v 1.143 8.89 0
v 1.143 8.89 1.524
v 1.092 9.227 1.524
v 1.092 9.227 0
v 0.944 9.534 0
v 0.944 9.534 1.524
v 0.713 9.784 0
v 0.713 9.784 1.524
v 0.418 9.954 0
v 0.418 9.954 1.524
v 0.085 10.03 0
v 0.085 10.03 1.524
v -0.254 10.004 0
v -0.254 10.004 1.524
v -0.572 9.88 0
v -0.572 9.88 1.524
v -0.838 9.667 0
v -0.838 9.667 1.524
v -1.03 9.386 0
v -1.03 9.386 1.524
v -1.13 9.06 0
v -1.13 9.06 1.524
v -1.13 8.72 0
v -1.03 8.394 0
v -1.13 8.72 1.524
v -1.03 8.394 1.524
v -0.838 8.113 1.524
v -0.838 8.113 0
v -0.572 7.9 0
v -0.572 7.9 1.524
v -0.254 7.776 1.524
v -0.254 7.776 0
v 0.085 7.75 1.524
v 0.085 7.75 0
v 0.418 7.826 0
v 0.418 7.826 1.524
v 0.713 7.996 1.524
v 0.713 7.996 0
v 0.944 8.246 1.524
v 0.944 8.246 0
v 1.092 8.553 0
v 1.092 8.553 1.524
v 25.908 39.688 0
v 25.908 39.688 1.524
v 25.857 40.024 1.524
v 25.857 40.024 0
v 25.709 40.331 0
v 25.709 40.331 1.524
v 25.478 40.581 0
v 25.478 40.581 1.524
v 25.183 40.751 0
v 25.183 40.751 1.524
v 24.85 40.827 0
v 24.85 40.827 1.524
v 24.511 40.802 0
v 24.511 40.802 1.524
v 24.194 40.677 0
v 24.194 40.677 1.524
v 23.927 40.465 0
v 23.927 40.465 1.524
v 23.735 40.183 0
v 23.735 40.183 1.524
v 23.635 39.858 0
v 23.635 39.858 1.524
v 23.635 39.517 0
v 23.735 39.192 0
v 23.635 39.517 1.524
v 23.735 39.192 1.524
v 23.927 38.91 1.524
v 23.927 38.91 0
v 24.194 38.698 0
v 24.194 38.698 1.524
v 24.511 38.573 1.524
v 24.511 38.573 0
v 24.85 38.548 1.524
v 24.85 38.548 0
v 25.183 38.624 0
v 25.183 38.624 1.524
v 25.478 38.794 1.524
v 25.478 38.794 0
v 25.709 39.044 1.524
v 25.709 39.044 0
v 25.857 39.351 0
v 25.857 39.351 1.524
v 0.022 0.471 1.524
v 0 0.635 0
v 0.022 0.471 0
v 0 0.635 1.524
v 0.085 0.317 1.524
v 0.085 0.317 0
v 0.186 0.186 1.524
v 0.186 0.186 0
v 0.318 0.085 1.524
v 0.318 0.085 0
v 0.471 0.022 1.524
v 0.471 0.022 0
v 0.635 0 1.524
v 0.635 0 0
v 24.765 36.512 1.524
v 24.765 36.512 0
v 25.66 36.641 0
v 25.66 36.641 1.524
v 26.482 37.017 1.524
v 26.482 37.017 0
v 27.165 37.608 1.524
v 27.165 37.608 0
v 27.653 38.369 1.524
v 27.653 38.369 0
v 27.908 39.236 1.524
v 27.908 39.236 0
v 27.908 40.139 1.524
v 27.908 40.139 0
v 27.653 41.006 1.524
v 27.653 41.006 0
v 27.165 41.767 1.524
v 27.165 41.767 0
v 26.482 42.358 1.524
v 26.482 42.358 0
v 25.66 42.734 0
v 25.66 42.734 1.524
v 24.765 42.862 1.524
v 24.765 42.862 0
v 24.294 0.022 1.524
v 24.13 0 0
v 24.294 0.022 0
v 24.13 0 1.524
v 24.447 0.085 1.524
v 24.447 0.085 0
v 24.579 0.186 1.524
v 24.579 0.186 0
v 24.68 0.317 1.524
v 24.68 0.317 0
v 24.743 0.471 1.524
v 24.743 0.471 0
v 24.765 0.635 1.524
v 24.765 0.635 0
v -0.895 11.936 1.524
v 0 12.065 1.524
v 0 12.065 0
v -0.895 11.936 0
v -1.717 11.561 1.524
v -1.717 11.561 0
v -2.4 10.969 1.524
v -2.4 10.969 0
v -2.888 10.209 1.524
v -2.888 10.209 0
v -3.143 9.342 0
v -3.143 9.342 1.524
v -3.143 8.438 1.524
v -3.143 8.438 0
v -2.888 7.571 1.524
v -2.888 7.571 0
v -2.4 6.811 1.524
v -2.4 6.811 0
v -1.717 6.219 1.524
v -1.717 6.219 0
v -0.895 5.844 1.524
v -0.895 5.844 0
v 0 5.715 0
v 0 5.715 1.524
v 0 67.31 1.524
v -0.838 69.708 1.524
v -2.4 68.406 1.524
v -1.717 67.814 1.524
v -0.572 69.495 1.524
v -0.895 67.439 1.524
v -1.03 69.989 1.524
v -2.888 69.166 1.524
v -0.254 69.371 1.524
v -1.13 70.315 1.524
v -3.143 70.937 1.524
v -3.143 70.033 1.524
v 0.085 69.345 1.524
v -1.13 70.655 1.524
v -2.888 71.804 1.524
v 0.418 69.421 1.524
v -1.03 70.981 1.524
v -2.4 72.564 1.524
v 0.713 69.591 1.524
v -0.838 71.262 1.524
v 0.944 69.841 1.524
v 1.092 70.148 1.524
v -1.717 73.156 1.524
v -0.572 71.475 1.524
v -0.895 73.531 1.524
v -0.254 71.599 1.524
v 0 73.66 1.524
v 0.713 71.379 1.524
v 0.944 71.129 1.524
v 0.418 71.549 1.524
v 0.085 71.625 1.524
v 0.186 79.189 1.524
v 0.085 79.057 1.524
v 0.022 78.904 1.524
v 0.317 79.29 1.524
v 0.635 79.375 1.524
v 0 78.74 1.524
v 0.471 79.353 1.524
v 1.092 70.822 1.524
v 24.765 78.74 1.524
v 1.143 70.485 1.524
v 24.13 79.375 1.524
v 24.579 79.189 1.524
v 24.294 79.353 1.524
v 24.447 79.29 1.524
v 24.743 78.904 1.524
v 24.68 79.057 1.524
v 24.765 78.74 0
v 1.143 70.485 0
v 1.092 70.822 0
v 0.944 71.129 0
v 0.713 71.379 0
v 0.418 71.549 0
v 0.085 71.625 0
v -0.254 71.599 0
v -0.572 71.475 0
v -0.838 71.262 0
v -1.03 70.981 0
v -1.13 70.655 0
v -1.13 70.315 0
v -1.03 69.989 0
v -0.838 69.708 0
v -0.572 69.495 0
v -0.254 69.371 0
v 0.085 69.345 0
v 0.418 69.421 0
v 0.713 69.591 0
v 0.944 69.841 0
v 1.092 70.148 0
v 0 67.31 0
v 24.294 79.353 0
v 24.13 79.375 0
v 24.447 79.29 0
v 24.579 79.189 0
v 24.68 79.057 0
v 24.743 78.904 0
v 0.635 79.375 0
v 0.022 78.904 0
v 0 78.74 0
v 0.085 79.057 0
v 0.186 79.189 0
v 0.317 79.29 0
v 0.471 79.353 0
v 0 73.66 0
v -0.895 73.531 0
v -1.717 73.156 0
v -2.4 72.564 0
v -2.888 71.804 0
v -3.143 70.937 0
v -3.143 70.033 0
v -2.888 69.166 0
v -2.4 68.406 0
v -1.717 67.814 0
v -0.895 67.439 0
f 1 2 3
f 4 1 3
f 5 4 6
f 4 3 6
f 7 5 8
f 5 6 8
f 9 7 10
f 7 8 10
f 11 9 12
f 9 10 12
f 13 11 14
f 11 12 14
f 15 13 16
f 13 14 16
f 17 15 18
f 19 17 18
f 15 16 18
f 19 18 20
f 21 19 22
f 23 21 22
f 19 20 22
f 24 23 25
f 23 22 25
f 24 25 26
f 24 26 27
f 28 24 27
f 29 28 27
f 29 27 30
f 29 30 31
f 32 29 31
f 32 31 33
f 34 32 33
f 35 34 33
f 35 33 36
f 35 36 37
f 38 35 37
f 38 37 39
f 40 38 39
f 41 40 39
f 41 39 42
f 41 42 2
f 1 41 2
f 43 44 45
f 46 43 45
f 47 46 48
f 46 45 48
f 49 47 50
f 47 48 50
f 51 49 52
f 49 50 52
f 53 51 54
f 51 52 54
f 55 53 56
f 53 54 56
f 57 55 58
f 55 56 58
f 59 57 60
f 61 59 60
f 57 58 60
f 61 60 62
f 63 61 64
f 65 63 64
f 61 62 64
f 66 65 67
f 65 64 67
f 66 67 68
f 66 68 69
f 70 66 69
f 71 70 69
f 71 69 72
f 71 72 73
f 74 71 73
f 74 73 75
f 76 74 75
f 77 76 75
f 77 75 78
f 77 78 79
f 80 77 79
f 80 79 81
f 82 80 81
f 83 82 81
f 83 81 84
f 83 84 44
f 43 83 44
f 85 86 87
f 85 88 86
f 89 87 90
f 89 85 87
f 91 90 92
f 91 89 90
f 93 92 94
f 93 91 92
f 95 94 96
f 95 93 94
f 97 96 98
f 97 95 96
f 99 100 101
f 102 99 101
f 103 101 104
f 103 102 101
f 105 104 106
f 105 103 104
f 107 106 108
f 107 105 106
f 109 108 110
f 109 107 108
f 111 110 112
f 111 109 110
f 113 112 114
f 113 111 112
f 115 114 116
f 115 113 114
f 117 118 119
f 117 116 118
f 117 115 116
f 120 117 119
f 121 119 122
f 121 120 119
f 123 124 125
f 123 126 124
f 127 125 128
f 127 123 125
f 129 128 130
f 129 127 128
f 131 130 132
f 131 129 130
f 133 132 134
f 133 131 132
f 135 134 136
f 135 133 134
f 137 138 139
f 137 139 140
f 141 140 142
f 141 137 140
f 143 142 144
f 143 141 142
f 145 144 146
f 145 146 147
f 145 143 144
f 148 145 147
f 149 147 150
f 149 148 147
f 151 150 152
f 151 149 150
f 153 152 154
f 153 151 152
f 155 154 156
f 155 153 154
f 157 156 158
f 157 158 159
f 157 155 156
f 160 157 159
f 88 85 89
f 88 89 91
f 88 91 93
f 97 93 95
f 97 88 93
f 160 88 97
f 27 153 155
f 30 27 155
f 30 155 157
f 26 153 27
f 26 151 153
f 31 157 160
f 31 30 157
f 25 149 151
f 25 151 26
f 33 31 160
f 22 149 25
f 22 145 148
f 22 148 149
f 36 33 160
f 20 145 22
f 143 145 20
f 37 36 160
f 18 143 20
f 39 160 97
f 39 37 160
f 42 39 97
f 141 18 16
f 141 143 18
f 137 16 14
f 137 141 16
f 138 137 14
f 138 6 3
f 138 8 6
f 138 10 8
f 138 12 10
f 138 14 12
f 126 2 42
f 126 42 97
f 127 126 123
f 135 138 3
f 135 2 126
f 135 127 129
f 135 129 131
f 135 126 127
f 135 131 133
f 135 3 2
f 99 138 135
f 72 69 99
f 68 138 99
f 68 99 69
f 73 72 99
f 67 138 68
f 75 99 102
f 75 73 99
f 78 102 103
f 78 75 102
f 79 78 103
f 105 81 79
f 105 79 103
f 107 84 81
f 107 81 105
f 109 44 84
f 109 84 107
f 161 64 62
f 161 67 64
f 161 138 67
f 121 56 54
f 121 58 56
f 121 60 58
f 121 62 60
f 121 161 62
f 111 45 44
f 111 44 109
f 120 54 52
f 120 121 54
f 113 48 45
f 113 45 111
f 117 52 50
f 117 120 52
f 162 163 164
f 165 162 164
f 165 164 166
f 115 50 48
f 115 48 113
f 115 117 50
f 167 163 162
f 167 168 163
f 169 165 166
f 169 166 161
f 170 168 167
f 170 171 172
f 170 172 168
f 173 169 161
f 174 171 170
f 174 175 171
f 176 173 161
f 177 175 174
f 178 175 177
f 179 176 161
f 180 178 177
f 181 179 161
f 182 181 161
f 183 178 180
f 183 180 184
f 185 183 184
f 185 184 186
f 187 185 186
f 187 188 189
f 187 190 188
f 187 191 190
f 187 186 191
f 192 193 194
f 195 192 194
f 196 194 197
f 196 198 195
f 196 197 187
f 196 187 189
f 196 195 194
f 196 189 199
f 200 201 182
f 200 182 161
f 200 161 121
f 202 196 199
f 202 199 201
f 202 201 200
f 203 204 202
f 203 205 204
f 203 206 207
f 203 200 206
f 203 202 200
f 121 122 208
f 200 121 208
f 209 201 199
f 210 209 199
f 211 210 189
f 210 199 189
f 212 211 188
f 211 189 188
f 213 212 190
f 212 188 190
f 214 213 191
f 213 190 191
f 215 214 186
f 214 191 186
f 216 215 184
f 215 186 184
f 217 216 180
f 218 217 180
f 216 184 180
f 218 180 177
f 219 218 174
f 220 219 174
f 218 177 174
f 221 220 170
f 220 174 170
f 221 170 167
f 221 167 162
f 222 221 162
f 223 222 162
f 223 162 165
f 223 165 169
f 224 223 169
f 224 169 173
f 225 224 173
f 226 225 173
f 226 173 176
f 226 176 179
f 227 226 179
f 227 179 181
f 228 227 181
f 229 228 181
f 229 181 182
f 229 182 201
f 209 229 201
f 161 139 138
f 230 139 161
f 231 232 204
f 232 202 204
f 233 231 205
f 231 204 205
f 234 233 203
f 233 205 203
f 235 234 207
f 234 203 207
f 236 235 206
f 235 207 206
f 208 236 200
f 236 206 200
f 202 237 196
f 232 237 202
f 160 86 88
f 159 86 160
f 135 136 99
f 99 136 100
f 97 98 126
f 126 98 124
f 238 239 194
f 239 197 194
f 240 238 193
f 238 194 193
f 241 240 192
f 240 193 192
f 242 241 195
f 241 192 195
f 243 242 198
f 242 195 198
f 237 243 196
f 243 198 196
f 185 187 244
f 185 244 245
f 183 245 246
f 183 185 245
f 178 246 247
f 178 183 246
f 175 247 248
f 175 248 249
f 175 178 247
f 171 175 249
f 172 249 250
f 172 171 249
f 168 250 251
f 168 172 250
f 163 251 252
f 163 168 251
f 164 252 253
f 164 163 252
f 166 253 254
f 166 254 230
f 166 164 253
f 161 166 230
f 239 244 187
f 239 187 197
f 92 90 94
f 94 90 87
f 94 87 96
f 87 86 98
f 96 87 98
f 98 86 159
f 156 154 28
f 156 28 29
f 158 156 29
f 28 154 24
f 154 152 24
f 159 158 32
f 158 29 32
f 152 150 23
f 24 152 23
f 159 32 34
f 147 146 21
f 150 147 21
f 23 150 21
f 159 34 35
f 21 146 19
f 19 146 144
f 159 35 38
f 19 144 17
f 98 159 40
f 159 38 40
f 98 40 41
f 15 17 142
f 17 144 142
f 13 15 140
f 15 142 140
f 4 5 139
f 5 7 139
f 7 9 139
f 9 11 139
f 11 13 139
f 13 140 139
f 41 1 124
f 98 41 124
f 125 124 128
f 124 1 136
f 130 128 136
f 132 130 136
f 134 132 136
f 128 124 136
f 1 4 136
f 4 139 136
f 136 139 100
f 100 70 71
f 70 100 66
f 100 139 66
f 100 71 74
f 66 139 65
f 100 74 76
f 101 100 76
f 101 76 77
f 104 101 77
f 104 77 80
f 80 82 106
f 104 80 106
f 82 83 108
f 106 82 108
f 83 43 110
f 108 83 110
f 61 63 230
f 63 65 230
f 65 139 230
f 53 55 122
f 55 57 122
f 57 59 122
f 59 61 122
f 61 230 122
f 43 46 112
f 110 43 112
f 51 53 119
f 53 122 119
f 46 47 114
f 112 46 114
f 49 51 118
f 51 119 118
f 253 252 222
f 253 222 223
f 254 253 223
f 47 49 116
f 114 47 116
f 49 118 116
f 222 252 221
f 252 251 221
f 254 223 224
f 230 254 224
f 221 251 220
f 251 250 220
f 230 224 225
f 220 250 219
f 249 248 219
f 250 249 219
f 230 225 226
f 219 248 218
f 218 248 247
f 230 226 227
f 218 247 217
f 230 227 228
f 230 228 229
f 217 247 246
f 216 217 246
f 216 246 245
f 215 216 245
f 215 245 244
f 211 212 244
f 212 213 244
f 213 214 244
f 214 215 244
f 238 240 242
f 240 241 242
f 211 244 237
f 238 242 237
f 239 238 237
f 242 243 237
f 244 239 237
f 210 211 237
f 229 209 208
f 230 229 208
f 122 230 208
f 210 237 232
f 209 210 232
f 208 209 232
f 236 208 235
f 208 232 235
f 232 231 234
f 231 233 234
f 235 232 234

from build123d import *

# Parameters (mm, degrees)
SKETCH1_W           = 24.765
SKETCH1_H           = 79.375
BOSS_EXTRUDE1_DEPTH = 1.524
SKETCH2_R           = 3.175
BOSS_EXTRUDE2_DEPTH = 1.524
SKETCH3_R           = 1.143
CUT_EXTRUDE1_DEPTH  = 85.162680572
FILLET1_R           = 0.635


with BuildPart() as part:
    # Sketch1 → Boss-Extrude1 (new body)
    with BuildSketch(Plane.XY):
        with Locations((12.3825, 39.6875)):
            Rectangle(SKETCH1_W, SKETCH1_H)
    extrude(amount=BOSS_EXTRUDE1_DEPTH)

    # Sketch2 → Boss-Extrude2 (add)
    with BuildSketch(Plane.XY.offset(1.524)):
        with Locations((0, 8.89)):
            Circle(SKETCH2_R)
        with Locations((24.765, 39.6875)):
            Circle(SKETCH2_R)
        with Locations((0, 70.485)):
            Circle(SKETCH2_R)
    extrude(amount=-BOSS_EXTRUDE2_DEPTH)

    # Sketch3 → Cut-Extrude1 (cut, through all)
    with BuildSketch(Plane.XY.offset(1.524)):
        with Locations((0, 8.89)):
            Circle(SKETCH3_R)
        with Locations((24.765, 39.6875)):
            Circle(SKETCH3_R)
        with Locations((0, 70.485)):
            Circle(SKETCH3_R)
    extrude(amount=-CUT_EXTRUDE1_DEPTH, mode=Mode.SUBTRACT)

    # Fillet1
    fillet1_edges = [part.edges().sort_by_distance(p)[0] for p in [
        (0, 79.375, 0.762),
        (24.765, 79.375, 0.762),
        (24.765, 0, 0.762),
        (0, 0, 0.762),
    ]]
    fillet(fillet1_edges, radius=FILLET1_R)


solid = part.part
